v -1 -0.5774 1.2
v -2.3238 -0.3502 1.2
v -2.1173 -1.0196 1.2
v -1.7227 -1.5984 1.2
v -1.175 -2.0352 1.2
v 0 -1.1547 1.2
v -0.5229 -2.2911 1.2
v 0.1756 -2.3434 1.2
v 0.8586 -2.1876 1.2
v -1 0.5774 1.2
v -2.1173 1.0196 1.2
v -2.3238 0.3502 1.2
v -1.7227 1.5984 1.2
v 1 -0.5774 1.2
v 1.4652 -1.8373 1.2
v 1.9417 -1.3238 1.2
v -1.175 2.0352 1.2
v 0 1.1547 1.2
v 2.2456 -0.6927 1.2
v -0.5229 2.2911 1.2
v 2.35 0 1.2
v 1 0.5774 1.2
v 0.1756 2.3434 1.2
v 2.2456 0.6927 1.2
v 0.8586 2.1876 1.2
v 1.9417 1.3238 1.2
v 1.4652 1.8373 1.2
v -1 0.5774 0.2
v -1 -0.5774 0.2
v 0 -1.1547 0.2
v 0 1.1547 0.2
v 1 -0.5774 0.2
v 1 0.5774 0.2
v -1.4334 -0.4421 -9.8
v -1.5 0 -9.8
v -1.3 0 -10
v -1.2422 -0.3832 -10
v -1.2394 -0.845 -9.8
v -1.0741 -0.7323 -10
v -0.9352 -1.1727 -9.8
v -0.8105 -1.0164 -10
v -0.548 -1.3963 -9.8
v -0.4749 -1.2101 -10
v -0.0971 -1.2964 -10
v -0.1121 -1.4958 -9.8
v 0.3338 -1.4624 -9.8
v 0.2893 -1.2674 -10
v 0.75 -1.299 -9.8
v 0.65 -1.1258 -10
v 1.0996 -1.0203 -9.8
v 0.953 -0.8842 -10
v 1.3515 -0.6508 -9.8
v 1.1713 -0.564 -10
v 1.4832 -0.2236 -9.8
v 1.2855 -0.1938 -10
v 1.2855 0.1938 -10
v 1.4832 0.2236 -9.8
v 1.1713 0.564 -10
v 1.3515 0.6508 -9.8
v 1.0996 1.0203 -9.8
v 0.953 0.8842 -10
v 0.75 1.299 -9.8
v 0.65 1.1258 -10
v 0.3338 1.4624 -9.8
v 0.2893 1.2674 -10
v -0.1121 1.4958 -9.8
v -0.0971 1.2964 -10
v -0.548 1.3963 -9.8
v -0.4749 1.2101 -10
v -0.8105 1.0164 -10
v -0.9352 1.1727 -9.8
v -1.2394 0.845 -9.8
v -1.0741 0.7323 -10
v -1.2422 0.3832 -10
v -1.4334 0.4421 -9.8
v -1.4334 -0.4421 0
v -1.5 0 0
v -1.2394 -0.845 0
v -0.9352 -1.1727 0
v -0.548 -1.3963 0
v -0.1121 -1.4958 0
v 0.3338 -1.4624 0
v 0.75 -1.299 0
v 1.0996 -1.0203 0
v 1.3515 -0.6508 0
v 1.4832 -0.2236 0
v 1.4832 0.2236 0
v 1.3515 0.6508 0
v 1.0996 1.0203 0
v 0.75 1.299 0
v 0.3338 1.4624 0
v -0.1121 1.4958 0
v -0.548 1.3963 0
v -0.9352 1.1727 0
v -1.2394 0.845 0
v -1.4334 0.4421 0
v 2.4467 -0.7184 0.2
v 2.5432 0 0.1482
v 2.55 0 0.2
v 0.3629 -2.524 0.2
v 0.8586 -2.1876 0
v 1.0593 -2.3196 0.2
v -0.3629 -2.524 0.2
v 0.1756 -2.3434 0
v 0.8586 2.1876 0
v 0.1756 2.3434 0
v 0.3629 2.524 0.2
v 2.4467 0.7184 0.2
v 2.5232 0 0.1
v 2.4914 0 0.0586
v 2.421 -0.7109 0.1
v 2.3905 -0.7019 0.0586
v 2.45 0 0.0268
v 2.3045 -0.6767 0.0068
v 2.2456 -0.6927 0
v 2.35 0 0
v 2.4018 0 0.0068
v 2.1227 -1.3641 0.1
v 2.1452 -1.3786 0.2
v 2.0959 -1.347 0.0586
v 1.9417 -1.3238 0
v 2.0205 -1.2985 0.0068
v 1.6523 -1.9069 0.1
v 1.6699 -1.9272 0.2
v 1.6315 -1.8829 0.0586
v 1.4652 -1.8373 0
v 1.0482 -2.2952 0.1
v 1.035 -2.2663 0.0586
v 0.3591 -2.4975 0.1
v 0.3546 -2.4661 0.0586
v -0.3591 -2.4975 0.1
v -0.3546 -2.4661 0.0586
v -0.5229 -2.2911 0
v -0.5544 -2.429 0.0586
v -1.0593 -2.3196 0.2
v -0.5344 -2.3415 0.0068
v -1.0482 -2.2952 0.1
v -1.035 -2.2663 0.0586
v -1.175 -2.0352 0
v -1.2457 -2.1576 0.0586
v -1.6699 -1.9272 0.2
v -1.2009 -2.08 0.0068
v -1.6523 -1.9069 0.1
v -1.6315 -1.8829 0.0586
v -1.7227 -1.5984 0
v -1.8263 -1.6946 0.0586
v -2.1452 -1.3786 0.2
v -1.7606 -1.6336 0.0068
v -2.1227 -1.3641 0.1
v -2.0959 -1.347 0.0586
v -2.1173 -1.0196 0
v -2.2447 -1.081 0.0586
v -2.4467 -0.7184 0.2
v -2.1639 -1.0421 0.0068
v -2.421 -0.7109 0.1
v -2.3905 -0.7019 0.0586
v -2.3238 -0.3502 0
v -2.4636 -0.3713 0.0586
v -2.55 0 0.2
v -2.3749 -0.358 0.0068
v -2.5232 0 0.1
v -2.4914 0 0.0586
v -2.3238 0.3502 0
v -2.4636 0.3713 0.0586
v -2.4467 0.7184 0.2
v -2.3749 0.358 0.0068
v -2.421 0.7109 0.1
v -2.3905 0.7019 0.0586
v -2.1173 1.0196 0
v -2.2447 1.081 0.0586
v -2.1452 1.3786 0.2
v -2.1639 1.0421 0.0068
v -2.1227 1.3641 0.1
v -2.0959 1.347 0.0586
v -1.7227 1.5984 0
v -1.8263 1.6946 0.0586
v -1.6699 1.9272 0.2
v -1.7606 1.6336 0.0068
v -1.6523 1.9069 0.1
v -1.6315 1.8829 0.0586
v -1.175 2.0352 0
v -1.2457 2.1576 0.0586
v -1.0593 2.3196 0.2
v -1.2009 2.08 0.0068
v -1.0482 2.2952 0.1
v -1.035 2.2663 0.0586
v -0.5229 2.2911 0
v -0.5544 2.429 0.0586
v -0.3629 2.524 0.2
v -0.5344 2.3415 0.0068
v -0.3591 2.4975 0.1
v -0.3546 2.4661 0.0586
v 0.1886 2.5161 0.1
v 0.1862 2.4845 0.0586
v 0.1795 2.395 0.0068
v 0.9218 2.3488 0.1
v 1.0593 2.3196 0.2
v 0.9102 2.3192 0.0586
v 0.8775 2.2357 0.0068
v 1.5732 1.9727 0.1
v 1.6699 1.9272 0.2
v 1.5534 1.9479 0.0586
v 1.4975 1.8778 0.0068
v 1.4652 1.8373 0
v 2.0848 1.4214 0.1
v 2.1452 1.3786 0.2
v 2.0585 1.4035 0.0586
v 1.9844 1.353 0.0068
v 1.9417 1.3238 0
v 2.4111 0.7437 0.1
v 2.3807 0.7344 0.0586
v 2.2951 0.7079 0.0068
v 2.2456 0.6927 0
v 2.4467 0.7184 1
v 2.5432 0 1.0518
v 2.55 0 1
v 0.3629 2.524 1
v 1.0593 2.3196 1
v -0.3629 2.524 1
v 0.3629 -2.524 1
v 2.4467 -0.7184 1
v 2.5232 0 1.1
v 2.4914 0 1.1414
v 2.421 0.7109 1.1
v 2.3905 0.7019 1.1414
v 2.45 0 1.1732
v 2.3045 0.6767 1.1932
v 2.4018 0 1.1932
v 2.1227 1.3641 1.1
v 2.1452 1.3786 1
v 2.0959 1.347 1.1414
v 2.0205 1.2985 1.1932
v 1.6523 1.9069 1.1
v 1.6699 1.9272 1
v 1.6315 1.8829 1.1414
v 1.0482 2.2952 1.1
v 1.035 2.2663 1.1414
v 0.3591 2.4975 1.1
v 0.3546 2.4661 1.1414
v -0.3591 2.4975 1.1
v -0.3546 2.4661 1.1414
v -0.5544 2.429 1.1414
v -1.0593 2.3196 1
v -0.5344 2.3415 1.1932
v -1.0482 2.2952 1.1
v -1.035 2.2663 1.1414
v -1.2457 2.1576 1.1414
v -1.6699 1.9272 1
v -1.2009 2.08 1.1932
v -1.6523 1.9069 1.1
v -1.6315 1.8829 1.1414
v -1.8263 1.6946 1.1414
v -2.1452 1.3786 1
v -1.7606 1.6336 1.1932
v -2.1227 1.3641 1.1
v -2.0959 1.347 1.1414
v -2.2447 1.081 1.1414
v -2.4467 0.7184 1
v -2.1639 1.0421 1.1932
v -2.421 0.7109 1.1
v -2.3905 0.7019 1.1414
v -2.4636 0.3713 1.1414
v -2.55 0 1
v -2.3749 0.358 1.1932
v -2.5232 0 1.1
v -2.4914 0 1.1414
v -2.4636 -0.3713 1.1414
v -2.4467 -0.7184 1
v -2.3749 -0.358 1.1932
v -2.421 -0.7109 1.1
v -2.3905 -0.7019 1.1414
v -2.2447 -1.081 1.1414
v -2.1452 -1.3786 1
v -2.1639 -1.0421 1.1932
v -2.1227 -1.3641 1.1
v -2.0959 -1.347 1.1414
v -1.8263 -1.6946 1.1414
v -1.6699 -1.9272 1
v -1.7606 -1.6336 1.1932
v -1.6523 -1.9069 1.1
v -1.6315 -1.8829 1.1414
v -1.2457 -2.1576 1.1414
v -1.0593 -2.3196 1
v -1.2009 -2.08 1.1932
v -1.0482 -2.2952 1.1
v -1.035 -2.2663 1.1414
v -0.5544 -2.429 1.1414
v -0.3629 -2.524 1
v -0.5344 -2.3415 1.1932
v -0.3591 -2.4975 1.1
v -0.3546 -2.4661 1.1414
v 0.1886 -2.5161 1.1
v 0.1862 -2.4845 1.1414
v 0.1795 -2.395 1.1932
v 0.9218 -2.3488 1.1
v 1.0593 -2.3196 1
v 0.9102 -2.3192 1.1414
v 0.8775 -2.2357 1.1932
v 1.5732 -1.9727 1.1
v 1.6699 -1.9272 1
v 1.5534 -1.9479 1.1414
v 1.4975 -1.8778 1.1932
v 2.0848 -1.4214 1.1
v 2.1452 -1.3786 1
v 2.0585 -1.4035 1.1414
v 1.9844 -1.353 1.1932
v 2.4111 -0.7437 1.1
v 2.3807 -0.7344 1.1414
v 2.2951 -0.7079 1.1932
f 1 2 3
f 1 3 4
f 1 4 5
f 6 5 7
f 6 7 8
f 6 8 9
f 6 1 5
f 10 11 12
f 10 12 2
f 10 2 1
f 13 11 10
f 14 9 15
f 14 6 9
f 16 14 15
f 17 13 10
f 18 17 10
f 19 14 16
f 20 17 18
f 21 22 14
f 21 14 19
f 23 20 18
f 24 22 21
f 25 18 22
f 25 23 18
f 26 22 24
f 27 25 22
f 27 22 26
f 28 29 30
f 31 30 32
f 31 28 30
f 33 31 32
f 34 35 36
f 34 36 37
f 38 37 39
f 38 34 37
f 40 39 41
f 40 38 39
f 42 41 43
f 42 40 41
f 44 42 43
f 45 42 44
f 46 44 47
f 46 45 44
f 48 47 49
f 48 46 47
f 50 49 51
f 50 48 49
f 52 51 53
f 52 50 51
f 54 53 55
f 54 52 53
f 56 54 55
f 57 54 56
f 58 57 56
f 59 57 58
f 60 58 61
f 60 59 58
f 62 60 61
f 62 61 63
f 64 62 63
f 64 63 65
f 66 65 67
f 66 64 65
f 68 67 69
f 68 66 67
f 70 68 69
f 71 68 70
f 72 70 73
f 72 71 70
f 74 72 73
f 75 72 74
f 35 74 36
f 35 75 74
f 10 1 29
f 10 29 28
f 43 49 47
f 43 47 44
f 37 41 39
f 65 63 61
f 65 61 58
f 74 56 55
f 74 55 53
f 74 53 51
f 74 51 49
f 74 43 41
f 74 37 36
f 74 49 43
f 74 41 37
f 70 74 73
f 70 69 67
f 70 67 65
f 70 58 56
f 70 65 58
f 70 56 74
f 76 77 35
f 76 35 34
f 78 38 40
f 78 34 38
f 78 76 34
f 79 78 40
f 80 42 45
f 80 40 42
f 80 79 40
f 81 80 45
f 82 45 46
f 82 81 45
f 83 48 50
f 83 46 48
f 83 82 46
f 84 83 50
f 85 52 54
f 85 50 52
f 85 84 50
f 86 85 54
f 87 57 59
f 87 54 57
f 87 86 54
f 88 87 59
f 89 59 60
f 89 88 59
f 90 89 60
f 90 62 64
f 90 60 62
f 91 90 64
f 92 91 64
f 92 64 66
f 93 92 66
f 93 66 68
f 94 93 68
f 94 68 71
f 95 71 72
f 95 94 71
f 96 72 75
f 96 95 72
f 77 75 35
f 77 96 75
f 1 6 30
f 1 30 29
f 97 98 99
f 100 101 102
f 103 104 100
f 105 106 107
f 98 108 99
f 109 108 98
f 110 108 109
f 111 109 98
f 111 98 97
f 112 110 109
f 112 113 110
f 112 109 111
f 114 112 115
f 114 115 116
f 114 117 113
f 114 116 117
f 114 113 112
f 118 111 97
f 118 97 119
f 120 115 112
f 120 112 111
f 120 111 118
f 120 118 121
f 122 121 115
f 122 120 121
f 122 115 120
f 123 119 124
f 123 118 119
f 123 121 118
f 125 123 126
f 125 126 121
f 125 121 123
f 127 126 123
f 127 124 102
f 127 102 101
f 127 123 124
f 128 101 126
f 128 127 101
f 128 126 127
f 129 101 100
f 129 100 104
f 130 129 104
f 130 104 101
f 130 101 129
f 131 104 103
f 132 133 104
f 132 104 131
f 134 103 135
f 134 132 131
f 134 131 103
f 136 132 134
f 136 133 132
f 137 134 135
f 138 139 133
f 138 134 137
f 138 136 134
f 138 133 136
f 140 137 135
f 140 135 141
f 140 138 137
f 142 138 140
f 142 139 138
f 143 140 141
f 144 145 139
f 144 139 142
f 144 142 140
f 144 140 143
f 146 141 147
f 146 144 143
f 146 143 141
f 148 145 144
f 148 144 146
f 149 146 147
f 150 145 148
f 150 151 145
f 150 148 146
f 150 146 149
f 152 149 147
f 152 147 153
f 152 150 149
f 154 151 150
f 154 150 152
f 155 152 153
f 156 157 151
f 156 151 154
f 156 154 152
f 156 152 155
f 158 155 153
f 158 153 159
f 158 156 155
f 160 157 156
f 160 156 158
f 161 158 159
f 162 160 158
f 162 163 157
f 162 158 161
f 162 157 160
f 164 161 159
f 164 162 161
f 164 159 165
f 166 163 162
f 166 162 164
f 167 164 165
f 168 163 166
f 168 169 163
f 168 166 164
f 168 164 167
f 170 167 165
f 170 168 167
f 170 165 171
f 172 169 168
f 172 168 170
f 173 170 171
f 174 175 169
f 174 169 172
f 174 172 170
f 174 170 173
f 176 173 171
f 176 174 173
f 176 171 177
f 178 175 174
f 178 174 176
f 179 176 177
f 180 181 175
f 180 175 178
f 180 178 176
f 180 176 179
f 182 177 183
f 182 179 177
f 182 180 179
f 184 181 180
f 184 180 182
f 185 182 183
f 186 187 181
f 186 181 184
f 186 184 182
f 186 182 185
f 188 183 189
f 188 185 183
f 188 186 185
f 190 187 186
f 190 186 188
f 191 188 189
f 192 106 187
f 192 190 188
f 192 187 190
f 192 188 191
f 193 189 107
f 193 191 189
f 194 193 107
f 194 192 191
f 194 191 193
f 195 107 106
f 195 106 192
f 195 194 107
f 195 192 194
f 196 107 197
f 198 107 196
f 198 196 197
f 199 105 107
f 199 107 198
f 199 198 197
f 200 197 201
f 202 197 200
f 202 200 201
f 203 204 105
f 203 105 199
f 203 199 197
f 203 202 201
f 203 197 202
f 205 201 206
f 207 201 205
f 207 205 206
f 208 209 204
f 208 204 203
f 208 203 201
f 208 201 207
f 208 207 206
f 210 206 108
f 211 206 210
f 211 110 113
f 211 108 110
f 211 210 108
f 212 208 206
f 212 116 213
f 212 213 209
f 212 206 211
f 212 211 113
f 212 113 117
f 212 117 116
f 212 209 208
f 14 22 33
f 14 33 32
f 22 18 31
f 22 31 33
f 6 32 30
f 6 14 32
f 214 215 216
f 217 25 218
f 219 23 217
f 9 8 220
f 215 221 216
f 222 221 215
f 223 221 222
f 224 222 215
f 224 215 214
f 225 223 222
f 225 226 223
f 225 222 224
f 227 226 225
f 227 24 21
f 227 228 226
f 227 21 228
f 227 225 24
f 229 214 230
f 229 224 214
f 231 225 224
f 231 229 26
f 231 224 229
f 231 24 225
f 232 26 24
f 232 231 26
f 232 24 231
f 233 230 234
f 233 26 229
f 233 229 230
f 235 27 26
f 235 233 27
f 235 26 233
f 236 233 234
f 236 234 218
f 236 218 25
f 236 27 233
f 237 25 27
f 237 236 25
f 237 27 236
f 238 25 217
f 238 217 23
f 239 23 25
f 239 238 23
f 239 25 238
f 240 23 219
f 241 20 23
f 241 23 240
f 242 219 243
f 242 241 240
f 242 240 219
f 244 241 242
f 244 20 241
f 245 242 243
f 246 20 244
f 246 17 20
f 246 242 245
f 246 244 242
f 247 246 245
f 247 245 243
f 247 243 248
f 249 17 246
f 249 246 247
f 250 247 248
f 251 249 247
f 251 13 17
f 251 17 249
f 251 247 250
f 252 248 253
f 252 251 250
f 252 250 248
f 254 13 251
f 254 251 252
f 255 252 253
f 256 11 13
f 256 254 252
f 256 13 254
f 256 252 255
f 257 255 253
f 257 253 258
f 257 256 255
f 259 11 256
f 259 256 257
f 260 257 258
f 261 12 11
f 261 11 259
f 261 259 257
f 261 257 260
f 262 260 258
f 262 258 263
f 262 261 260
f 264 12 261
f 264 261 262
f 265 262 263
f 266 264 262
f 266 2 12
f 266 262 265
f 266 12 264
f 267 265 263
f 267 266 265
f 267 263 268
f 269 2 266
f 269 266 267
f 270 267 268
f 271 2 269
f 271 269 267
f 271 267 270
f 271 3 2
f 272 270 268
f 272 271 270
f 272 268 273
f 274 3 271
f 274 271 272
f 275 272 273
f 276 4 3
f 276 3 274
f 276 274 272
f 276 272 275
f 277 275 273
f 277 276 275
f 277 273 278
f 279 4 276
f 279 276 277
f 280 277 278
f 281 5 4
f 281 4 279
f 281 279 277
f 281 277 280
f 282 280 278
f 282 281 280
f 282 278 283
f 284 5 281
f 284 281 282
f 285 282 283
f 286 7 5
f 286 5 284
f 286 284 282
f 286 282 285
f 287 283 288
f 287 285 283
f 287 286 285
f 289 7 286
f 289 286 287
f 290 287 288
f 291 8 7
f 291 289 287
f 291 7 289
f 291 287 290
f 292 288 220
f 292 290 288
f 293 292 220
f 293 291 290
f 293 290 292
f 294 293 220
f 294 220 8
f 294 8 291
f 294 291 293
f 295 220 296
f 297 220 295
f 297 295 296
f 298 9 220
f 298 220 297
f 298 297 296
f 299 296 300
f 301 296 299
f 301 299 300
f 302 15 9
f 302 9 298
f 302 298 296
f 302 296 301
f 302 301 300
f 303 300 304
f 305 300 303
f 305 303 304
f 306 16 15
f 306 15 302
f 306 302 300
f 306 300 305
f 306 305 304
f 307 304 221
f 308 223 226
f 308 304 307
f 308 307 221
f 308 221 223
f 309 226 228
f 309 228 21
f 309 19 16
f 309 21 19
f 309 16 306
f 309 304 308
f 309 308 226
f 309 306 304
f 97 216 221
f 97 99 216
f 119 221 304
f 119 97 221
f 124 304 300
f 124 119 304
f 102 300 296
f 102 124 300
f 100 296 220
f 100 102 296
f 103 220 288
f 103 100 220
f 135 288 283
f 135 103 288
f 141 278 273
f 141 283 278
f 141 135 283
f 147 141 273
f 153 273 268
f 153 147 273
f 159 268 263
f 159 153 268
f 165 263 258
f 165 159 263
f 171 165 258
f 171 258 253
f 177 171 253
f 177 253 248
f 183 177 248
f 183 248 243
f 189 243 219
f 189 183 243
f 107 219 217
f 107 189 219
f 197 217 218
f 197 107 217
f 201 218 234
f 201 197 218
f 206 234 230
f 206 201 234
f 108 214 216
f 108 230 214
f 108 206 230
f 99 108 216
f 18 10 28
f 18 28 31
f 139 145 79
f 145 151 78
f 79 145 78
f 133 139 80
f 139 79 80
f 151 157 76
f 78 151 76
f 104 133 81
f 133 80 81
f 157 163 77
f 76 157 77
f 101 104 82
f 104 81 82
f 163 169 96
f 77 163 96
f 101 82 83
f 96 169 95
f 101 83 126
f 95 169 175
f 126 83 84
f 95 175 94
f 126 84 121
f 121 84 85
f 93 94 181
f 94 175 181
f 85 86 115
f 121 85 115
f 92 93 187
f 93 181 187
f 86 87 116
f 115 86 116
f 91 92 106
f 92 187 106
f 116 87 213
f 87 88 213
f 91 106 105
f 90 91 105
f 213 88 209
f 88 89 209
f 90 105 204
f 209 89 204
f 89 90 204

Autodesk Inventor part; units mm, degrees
ref_plane "YZ Plane" through (0, 0, 0) normal (1, 0, 0) x (0, 1, 0)
ref_plane "XZ Plane" through (0, 0, 0) normal (0, 1, 0) x (-1, 0, 0)
ref_plane "XY Plane" through (0, 0, 0) normal (0, 0, 1) x (1, 0, 0)
sketch "スケッチ1" plane through (0, 0, 0) normal (0, 0, 1) x (1, 0, 0)
  circle A0 centre (0, 0) radius 2.55
  dimension "d0" = 5.1
extrude "押し出し1" add sketch "スケッチ1" along normal blind 1.2
sketch "スケッチ2" plane through (0, 0, 0) normal (0, 0, -1) x (-1, 0, 0)
  circle A0 centre (0, 0) radius 2.55 projected
  circle A1 centre (0, 0) radius 1.5
  dimension "d3" = 3
extrude "押し出し2" add sketch "スケッチ2" along normal blind 10 contours A1
thread "ねじ1" size "M3x0.5" class "6g" standard "ANSI Metric M Profile" full length
sketch "スケッチ3" plane through (0, 0, 1.2) normal (0, 0, 1) x (1, 0, 0)
  circle A0 centre (0, 0) radius 2.55 projected
  line L0 (0, 1.1547) -> (1, 0.5774)
  line L1 (1, 0.5774) -> (1, -0.5774)
  line L2 (1, -0.5774) -> (0, -1.1547)
  line L3 (0, -1.1547) -> (-1, -0.5774)
  line L4 (-1, -0.5774) -> (-1, 0.5774)
  line L5 (-1, 0.5774) -> (0, 1.1547)
  dimension "d8" = 2
extrude "押し出し3" cut sketch "スケッチ3" against normal blind 1 contours L0 L1 L2 L3 L4 L5
fillet "フィレット1" radius 0.2 2 edges at (-2.55, 0, 1.2) (-2.55, 0, 0)
chamfer "面取り1" distance 0.2 angle 45 1 edges at (1.5, 0, -10)
properties part number "六角穴付低頭平 M3 x 10" material "鋼"
